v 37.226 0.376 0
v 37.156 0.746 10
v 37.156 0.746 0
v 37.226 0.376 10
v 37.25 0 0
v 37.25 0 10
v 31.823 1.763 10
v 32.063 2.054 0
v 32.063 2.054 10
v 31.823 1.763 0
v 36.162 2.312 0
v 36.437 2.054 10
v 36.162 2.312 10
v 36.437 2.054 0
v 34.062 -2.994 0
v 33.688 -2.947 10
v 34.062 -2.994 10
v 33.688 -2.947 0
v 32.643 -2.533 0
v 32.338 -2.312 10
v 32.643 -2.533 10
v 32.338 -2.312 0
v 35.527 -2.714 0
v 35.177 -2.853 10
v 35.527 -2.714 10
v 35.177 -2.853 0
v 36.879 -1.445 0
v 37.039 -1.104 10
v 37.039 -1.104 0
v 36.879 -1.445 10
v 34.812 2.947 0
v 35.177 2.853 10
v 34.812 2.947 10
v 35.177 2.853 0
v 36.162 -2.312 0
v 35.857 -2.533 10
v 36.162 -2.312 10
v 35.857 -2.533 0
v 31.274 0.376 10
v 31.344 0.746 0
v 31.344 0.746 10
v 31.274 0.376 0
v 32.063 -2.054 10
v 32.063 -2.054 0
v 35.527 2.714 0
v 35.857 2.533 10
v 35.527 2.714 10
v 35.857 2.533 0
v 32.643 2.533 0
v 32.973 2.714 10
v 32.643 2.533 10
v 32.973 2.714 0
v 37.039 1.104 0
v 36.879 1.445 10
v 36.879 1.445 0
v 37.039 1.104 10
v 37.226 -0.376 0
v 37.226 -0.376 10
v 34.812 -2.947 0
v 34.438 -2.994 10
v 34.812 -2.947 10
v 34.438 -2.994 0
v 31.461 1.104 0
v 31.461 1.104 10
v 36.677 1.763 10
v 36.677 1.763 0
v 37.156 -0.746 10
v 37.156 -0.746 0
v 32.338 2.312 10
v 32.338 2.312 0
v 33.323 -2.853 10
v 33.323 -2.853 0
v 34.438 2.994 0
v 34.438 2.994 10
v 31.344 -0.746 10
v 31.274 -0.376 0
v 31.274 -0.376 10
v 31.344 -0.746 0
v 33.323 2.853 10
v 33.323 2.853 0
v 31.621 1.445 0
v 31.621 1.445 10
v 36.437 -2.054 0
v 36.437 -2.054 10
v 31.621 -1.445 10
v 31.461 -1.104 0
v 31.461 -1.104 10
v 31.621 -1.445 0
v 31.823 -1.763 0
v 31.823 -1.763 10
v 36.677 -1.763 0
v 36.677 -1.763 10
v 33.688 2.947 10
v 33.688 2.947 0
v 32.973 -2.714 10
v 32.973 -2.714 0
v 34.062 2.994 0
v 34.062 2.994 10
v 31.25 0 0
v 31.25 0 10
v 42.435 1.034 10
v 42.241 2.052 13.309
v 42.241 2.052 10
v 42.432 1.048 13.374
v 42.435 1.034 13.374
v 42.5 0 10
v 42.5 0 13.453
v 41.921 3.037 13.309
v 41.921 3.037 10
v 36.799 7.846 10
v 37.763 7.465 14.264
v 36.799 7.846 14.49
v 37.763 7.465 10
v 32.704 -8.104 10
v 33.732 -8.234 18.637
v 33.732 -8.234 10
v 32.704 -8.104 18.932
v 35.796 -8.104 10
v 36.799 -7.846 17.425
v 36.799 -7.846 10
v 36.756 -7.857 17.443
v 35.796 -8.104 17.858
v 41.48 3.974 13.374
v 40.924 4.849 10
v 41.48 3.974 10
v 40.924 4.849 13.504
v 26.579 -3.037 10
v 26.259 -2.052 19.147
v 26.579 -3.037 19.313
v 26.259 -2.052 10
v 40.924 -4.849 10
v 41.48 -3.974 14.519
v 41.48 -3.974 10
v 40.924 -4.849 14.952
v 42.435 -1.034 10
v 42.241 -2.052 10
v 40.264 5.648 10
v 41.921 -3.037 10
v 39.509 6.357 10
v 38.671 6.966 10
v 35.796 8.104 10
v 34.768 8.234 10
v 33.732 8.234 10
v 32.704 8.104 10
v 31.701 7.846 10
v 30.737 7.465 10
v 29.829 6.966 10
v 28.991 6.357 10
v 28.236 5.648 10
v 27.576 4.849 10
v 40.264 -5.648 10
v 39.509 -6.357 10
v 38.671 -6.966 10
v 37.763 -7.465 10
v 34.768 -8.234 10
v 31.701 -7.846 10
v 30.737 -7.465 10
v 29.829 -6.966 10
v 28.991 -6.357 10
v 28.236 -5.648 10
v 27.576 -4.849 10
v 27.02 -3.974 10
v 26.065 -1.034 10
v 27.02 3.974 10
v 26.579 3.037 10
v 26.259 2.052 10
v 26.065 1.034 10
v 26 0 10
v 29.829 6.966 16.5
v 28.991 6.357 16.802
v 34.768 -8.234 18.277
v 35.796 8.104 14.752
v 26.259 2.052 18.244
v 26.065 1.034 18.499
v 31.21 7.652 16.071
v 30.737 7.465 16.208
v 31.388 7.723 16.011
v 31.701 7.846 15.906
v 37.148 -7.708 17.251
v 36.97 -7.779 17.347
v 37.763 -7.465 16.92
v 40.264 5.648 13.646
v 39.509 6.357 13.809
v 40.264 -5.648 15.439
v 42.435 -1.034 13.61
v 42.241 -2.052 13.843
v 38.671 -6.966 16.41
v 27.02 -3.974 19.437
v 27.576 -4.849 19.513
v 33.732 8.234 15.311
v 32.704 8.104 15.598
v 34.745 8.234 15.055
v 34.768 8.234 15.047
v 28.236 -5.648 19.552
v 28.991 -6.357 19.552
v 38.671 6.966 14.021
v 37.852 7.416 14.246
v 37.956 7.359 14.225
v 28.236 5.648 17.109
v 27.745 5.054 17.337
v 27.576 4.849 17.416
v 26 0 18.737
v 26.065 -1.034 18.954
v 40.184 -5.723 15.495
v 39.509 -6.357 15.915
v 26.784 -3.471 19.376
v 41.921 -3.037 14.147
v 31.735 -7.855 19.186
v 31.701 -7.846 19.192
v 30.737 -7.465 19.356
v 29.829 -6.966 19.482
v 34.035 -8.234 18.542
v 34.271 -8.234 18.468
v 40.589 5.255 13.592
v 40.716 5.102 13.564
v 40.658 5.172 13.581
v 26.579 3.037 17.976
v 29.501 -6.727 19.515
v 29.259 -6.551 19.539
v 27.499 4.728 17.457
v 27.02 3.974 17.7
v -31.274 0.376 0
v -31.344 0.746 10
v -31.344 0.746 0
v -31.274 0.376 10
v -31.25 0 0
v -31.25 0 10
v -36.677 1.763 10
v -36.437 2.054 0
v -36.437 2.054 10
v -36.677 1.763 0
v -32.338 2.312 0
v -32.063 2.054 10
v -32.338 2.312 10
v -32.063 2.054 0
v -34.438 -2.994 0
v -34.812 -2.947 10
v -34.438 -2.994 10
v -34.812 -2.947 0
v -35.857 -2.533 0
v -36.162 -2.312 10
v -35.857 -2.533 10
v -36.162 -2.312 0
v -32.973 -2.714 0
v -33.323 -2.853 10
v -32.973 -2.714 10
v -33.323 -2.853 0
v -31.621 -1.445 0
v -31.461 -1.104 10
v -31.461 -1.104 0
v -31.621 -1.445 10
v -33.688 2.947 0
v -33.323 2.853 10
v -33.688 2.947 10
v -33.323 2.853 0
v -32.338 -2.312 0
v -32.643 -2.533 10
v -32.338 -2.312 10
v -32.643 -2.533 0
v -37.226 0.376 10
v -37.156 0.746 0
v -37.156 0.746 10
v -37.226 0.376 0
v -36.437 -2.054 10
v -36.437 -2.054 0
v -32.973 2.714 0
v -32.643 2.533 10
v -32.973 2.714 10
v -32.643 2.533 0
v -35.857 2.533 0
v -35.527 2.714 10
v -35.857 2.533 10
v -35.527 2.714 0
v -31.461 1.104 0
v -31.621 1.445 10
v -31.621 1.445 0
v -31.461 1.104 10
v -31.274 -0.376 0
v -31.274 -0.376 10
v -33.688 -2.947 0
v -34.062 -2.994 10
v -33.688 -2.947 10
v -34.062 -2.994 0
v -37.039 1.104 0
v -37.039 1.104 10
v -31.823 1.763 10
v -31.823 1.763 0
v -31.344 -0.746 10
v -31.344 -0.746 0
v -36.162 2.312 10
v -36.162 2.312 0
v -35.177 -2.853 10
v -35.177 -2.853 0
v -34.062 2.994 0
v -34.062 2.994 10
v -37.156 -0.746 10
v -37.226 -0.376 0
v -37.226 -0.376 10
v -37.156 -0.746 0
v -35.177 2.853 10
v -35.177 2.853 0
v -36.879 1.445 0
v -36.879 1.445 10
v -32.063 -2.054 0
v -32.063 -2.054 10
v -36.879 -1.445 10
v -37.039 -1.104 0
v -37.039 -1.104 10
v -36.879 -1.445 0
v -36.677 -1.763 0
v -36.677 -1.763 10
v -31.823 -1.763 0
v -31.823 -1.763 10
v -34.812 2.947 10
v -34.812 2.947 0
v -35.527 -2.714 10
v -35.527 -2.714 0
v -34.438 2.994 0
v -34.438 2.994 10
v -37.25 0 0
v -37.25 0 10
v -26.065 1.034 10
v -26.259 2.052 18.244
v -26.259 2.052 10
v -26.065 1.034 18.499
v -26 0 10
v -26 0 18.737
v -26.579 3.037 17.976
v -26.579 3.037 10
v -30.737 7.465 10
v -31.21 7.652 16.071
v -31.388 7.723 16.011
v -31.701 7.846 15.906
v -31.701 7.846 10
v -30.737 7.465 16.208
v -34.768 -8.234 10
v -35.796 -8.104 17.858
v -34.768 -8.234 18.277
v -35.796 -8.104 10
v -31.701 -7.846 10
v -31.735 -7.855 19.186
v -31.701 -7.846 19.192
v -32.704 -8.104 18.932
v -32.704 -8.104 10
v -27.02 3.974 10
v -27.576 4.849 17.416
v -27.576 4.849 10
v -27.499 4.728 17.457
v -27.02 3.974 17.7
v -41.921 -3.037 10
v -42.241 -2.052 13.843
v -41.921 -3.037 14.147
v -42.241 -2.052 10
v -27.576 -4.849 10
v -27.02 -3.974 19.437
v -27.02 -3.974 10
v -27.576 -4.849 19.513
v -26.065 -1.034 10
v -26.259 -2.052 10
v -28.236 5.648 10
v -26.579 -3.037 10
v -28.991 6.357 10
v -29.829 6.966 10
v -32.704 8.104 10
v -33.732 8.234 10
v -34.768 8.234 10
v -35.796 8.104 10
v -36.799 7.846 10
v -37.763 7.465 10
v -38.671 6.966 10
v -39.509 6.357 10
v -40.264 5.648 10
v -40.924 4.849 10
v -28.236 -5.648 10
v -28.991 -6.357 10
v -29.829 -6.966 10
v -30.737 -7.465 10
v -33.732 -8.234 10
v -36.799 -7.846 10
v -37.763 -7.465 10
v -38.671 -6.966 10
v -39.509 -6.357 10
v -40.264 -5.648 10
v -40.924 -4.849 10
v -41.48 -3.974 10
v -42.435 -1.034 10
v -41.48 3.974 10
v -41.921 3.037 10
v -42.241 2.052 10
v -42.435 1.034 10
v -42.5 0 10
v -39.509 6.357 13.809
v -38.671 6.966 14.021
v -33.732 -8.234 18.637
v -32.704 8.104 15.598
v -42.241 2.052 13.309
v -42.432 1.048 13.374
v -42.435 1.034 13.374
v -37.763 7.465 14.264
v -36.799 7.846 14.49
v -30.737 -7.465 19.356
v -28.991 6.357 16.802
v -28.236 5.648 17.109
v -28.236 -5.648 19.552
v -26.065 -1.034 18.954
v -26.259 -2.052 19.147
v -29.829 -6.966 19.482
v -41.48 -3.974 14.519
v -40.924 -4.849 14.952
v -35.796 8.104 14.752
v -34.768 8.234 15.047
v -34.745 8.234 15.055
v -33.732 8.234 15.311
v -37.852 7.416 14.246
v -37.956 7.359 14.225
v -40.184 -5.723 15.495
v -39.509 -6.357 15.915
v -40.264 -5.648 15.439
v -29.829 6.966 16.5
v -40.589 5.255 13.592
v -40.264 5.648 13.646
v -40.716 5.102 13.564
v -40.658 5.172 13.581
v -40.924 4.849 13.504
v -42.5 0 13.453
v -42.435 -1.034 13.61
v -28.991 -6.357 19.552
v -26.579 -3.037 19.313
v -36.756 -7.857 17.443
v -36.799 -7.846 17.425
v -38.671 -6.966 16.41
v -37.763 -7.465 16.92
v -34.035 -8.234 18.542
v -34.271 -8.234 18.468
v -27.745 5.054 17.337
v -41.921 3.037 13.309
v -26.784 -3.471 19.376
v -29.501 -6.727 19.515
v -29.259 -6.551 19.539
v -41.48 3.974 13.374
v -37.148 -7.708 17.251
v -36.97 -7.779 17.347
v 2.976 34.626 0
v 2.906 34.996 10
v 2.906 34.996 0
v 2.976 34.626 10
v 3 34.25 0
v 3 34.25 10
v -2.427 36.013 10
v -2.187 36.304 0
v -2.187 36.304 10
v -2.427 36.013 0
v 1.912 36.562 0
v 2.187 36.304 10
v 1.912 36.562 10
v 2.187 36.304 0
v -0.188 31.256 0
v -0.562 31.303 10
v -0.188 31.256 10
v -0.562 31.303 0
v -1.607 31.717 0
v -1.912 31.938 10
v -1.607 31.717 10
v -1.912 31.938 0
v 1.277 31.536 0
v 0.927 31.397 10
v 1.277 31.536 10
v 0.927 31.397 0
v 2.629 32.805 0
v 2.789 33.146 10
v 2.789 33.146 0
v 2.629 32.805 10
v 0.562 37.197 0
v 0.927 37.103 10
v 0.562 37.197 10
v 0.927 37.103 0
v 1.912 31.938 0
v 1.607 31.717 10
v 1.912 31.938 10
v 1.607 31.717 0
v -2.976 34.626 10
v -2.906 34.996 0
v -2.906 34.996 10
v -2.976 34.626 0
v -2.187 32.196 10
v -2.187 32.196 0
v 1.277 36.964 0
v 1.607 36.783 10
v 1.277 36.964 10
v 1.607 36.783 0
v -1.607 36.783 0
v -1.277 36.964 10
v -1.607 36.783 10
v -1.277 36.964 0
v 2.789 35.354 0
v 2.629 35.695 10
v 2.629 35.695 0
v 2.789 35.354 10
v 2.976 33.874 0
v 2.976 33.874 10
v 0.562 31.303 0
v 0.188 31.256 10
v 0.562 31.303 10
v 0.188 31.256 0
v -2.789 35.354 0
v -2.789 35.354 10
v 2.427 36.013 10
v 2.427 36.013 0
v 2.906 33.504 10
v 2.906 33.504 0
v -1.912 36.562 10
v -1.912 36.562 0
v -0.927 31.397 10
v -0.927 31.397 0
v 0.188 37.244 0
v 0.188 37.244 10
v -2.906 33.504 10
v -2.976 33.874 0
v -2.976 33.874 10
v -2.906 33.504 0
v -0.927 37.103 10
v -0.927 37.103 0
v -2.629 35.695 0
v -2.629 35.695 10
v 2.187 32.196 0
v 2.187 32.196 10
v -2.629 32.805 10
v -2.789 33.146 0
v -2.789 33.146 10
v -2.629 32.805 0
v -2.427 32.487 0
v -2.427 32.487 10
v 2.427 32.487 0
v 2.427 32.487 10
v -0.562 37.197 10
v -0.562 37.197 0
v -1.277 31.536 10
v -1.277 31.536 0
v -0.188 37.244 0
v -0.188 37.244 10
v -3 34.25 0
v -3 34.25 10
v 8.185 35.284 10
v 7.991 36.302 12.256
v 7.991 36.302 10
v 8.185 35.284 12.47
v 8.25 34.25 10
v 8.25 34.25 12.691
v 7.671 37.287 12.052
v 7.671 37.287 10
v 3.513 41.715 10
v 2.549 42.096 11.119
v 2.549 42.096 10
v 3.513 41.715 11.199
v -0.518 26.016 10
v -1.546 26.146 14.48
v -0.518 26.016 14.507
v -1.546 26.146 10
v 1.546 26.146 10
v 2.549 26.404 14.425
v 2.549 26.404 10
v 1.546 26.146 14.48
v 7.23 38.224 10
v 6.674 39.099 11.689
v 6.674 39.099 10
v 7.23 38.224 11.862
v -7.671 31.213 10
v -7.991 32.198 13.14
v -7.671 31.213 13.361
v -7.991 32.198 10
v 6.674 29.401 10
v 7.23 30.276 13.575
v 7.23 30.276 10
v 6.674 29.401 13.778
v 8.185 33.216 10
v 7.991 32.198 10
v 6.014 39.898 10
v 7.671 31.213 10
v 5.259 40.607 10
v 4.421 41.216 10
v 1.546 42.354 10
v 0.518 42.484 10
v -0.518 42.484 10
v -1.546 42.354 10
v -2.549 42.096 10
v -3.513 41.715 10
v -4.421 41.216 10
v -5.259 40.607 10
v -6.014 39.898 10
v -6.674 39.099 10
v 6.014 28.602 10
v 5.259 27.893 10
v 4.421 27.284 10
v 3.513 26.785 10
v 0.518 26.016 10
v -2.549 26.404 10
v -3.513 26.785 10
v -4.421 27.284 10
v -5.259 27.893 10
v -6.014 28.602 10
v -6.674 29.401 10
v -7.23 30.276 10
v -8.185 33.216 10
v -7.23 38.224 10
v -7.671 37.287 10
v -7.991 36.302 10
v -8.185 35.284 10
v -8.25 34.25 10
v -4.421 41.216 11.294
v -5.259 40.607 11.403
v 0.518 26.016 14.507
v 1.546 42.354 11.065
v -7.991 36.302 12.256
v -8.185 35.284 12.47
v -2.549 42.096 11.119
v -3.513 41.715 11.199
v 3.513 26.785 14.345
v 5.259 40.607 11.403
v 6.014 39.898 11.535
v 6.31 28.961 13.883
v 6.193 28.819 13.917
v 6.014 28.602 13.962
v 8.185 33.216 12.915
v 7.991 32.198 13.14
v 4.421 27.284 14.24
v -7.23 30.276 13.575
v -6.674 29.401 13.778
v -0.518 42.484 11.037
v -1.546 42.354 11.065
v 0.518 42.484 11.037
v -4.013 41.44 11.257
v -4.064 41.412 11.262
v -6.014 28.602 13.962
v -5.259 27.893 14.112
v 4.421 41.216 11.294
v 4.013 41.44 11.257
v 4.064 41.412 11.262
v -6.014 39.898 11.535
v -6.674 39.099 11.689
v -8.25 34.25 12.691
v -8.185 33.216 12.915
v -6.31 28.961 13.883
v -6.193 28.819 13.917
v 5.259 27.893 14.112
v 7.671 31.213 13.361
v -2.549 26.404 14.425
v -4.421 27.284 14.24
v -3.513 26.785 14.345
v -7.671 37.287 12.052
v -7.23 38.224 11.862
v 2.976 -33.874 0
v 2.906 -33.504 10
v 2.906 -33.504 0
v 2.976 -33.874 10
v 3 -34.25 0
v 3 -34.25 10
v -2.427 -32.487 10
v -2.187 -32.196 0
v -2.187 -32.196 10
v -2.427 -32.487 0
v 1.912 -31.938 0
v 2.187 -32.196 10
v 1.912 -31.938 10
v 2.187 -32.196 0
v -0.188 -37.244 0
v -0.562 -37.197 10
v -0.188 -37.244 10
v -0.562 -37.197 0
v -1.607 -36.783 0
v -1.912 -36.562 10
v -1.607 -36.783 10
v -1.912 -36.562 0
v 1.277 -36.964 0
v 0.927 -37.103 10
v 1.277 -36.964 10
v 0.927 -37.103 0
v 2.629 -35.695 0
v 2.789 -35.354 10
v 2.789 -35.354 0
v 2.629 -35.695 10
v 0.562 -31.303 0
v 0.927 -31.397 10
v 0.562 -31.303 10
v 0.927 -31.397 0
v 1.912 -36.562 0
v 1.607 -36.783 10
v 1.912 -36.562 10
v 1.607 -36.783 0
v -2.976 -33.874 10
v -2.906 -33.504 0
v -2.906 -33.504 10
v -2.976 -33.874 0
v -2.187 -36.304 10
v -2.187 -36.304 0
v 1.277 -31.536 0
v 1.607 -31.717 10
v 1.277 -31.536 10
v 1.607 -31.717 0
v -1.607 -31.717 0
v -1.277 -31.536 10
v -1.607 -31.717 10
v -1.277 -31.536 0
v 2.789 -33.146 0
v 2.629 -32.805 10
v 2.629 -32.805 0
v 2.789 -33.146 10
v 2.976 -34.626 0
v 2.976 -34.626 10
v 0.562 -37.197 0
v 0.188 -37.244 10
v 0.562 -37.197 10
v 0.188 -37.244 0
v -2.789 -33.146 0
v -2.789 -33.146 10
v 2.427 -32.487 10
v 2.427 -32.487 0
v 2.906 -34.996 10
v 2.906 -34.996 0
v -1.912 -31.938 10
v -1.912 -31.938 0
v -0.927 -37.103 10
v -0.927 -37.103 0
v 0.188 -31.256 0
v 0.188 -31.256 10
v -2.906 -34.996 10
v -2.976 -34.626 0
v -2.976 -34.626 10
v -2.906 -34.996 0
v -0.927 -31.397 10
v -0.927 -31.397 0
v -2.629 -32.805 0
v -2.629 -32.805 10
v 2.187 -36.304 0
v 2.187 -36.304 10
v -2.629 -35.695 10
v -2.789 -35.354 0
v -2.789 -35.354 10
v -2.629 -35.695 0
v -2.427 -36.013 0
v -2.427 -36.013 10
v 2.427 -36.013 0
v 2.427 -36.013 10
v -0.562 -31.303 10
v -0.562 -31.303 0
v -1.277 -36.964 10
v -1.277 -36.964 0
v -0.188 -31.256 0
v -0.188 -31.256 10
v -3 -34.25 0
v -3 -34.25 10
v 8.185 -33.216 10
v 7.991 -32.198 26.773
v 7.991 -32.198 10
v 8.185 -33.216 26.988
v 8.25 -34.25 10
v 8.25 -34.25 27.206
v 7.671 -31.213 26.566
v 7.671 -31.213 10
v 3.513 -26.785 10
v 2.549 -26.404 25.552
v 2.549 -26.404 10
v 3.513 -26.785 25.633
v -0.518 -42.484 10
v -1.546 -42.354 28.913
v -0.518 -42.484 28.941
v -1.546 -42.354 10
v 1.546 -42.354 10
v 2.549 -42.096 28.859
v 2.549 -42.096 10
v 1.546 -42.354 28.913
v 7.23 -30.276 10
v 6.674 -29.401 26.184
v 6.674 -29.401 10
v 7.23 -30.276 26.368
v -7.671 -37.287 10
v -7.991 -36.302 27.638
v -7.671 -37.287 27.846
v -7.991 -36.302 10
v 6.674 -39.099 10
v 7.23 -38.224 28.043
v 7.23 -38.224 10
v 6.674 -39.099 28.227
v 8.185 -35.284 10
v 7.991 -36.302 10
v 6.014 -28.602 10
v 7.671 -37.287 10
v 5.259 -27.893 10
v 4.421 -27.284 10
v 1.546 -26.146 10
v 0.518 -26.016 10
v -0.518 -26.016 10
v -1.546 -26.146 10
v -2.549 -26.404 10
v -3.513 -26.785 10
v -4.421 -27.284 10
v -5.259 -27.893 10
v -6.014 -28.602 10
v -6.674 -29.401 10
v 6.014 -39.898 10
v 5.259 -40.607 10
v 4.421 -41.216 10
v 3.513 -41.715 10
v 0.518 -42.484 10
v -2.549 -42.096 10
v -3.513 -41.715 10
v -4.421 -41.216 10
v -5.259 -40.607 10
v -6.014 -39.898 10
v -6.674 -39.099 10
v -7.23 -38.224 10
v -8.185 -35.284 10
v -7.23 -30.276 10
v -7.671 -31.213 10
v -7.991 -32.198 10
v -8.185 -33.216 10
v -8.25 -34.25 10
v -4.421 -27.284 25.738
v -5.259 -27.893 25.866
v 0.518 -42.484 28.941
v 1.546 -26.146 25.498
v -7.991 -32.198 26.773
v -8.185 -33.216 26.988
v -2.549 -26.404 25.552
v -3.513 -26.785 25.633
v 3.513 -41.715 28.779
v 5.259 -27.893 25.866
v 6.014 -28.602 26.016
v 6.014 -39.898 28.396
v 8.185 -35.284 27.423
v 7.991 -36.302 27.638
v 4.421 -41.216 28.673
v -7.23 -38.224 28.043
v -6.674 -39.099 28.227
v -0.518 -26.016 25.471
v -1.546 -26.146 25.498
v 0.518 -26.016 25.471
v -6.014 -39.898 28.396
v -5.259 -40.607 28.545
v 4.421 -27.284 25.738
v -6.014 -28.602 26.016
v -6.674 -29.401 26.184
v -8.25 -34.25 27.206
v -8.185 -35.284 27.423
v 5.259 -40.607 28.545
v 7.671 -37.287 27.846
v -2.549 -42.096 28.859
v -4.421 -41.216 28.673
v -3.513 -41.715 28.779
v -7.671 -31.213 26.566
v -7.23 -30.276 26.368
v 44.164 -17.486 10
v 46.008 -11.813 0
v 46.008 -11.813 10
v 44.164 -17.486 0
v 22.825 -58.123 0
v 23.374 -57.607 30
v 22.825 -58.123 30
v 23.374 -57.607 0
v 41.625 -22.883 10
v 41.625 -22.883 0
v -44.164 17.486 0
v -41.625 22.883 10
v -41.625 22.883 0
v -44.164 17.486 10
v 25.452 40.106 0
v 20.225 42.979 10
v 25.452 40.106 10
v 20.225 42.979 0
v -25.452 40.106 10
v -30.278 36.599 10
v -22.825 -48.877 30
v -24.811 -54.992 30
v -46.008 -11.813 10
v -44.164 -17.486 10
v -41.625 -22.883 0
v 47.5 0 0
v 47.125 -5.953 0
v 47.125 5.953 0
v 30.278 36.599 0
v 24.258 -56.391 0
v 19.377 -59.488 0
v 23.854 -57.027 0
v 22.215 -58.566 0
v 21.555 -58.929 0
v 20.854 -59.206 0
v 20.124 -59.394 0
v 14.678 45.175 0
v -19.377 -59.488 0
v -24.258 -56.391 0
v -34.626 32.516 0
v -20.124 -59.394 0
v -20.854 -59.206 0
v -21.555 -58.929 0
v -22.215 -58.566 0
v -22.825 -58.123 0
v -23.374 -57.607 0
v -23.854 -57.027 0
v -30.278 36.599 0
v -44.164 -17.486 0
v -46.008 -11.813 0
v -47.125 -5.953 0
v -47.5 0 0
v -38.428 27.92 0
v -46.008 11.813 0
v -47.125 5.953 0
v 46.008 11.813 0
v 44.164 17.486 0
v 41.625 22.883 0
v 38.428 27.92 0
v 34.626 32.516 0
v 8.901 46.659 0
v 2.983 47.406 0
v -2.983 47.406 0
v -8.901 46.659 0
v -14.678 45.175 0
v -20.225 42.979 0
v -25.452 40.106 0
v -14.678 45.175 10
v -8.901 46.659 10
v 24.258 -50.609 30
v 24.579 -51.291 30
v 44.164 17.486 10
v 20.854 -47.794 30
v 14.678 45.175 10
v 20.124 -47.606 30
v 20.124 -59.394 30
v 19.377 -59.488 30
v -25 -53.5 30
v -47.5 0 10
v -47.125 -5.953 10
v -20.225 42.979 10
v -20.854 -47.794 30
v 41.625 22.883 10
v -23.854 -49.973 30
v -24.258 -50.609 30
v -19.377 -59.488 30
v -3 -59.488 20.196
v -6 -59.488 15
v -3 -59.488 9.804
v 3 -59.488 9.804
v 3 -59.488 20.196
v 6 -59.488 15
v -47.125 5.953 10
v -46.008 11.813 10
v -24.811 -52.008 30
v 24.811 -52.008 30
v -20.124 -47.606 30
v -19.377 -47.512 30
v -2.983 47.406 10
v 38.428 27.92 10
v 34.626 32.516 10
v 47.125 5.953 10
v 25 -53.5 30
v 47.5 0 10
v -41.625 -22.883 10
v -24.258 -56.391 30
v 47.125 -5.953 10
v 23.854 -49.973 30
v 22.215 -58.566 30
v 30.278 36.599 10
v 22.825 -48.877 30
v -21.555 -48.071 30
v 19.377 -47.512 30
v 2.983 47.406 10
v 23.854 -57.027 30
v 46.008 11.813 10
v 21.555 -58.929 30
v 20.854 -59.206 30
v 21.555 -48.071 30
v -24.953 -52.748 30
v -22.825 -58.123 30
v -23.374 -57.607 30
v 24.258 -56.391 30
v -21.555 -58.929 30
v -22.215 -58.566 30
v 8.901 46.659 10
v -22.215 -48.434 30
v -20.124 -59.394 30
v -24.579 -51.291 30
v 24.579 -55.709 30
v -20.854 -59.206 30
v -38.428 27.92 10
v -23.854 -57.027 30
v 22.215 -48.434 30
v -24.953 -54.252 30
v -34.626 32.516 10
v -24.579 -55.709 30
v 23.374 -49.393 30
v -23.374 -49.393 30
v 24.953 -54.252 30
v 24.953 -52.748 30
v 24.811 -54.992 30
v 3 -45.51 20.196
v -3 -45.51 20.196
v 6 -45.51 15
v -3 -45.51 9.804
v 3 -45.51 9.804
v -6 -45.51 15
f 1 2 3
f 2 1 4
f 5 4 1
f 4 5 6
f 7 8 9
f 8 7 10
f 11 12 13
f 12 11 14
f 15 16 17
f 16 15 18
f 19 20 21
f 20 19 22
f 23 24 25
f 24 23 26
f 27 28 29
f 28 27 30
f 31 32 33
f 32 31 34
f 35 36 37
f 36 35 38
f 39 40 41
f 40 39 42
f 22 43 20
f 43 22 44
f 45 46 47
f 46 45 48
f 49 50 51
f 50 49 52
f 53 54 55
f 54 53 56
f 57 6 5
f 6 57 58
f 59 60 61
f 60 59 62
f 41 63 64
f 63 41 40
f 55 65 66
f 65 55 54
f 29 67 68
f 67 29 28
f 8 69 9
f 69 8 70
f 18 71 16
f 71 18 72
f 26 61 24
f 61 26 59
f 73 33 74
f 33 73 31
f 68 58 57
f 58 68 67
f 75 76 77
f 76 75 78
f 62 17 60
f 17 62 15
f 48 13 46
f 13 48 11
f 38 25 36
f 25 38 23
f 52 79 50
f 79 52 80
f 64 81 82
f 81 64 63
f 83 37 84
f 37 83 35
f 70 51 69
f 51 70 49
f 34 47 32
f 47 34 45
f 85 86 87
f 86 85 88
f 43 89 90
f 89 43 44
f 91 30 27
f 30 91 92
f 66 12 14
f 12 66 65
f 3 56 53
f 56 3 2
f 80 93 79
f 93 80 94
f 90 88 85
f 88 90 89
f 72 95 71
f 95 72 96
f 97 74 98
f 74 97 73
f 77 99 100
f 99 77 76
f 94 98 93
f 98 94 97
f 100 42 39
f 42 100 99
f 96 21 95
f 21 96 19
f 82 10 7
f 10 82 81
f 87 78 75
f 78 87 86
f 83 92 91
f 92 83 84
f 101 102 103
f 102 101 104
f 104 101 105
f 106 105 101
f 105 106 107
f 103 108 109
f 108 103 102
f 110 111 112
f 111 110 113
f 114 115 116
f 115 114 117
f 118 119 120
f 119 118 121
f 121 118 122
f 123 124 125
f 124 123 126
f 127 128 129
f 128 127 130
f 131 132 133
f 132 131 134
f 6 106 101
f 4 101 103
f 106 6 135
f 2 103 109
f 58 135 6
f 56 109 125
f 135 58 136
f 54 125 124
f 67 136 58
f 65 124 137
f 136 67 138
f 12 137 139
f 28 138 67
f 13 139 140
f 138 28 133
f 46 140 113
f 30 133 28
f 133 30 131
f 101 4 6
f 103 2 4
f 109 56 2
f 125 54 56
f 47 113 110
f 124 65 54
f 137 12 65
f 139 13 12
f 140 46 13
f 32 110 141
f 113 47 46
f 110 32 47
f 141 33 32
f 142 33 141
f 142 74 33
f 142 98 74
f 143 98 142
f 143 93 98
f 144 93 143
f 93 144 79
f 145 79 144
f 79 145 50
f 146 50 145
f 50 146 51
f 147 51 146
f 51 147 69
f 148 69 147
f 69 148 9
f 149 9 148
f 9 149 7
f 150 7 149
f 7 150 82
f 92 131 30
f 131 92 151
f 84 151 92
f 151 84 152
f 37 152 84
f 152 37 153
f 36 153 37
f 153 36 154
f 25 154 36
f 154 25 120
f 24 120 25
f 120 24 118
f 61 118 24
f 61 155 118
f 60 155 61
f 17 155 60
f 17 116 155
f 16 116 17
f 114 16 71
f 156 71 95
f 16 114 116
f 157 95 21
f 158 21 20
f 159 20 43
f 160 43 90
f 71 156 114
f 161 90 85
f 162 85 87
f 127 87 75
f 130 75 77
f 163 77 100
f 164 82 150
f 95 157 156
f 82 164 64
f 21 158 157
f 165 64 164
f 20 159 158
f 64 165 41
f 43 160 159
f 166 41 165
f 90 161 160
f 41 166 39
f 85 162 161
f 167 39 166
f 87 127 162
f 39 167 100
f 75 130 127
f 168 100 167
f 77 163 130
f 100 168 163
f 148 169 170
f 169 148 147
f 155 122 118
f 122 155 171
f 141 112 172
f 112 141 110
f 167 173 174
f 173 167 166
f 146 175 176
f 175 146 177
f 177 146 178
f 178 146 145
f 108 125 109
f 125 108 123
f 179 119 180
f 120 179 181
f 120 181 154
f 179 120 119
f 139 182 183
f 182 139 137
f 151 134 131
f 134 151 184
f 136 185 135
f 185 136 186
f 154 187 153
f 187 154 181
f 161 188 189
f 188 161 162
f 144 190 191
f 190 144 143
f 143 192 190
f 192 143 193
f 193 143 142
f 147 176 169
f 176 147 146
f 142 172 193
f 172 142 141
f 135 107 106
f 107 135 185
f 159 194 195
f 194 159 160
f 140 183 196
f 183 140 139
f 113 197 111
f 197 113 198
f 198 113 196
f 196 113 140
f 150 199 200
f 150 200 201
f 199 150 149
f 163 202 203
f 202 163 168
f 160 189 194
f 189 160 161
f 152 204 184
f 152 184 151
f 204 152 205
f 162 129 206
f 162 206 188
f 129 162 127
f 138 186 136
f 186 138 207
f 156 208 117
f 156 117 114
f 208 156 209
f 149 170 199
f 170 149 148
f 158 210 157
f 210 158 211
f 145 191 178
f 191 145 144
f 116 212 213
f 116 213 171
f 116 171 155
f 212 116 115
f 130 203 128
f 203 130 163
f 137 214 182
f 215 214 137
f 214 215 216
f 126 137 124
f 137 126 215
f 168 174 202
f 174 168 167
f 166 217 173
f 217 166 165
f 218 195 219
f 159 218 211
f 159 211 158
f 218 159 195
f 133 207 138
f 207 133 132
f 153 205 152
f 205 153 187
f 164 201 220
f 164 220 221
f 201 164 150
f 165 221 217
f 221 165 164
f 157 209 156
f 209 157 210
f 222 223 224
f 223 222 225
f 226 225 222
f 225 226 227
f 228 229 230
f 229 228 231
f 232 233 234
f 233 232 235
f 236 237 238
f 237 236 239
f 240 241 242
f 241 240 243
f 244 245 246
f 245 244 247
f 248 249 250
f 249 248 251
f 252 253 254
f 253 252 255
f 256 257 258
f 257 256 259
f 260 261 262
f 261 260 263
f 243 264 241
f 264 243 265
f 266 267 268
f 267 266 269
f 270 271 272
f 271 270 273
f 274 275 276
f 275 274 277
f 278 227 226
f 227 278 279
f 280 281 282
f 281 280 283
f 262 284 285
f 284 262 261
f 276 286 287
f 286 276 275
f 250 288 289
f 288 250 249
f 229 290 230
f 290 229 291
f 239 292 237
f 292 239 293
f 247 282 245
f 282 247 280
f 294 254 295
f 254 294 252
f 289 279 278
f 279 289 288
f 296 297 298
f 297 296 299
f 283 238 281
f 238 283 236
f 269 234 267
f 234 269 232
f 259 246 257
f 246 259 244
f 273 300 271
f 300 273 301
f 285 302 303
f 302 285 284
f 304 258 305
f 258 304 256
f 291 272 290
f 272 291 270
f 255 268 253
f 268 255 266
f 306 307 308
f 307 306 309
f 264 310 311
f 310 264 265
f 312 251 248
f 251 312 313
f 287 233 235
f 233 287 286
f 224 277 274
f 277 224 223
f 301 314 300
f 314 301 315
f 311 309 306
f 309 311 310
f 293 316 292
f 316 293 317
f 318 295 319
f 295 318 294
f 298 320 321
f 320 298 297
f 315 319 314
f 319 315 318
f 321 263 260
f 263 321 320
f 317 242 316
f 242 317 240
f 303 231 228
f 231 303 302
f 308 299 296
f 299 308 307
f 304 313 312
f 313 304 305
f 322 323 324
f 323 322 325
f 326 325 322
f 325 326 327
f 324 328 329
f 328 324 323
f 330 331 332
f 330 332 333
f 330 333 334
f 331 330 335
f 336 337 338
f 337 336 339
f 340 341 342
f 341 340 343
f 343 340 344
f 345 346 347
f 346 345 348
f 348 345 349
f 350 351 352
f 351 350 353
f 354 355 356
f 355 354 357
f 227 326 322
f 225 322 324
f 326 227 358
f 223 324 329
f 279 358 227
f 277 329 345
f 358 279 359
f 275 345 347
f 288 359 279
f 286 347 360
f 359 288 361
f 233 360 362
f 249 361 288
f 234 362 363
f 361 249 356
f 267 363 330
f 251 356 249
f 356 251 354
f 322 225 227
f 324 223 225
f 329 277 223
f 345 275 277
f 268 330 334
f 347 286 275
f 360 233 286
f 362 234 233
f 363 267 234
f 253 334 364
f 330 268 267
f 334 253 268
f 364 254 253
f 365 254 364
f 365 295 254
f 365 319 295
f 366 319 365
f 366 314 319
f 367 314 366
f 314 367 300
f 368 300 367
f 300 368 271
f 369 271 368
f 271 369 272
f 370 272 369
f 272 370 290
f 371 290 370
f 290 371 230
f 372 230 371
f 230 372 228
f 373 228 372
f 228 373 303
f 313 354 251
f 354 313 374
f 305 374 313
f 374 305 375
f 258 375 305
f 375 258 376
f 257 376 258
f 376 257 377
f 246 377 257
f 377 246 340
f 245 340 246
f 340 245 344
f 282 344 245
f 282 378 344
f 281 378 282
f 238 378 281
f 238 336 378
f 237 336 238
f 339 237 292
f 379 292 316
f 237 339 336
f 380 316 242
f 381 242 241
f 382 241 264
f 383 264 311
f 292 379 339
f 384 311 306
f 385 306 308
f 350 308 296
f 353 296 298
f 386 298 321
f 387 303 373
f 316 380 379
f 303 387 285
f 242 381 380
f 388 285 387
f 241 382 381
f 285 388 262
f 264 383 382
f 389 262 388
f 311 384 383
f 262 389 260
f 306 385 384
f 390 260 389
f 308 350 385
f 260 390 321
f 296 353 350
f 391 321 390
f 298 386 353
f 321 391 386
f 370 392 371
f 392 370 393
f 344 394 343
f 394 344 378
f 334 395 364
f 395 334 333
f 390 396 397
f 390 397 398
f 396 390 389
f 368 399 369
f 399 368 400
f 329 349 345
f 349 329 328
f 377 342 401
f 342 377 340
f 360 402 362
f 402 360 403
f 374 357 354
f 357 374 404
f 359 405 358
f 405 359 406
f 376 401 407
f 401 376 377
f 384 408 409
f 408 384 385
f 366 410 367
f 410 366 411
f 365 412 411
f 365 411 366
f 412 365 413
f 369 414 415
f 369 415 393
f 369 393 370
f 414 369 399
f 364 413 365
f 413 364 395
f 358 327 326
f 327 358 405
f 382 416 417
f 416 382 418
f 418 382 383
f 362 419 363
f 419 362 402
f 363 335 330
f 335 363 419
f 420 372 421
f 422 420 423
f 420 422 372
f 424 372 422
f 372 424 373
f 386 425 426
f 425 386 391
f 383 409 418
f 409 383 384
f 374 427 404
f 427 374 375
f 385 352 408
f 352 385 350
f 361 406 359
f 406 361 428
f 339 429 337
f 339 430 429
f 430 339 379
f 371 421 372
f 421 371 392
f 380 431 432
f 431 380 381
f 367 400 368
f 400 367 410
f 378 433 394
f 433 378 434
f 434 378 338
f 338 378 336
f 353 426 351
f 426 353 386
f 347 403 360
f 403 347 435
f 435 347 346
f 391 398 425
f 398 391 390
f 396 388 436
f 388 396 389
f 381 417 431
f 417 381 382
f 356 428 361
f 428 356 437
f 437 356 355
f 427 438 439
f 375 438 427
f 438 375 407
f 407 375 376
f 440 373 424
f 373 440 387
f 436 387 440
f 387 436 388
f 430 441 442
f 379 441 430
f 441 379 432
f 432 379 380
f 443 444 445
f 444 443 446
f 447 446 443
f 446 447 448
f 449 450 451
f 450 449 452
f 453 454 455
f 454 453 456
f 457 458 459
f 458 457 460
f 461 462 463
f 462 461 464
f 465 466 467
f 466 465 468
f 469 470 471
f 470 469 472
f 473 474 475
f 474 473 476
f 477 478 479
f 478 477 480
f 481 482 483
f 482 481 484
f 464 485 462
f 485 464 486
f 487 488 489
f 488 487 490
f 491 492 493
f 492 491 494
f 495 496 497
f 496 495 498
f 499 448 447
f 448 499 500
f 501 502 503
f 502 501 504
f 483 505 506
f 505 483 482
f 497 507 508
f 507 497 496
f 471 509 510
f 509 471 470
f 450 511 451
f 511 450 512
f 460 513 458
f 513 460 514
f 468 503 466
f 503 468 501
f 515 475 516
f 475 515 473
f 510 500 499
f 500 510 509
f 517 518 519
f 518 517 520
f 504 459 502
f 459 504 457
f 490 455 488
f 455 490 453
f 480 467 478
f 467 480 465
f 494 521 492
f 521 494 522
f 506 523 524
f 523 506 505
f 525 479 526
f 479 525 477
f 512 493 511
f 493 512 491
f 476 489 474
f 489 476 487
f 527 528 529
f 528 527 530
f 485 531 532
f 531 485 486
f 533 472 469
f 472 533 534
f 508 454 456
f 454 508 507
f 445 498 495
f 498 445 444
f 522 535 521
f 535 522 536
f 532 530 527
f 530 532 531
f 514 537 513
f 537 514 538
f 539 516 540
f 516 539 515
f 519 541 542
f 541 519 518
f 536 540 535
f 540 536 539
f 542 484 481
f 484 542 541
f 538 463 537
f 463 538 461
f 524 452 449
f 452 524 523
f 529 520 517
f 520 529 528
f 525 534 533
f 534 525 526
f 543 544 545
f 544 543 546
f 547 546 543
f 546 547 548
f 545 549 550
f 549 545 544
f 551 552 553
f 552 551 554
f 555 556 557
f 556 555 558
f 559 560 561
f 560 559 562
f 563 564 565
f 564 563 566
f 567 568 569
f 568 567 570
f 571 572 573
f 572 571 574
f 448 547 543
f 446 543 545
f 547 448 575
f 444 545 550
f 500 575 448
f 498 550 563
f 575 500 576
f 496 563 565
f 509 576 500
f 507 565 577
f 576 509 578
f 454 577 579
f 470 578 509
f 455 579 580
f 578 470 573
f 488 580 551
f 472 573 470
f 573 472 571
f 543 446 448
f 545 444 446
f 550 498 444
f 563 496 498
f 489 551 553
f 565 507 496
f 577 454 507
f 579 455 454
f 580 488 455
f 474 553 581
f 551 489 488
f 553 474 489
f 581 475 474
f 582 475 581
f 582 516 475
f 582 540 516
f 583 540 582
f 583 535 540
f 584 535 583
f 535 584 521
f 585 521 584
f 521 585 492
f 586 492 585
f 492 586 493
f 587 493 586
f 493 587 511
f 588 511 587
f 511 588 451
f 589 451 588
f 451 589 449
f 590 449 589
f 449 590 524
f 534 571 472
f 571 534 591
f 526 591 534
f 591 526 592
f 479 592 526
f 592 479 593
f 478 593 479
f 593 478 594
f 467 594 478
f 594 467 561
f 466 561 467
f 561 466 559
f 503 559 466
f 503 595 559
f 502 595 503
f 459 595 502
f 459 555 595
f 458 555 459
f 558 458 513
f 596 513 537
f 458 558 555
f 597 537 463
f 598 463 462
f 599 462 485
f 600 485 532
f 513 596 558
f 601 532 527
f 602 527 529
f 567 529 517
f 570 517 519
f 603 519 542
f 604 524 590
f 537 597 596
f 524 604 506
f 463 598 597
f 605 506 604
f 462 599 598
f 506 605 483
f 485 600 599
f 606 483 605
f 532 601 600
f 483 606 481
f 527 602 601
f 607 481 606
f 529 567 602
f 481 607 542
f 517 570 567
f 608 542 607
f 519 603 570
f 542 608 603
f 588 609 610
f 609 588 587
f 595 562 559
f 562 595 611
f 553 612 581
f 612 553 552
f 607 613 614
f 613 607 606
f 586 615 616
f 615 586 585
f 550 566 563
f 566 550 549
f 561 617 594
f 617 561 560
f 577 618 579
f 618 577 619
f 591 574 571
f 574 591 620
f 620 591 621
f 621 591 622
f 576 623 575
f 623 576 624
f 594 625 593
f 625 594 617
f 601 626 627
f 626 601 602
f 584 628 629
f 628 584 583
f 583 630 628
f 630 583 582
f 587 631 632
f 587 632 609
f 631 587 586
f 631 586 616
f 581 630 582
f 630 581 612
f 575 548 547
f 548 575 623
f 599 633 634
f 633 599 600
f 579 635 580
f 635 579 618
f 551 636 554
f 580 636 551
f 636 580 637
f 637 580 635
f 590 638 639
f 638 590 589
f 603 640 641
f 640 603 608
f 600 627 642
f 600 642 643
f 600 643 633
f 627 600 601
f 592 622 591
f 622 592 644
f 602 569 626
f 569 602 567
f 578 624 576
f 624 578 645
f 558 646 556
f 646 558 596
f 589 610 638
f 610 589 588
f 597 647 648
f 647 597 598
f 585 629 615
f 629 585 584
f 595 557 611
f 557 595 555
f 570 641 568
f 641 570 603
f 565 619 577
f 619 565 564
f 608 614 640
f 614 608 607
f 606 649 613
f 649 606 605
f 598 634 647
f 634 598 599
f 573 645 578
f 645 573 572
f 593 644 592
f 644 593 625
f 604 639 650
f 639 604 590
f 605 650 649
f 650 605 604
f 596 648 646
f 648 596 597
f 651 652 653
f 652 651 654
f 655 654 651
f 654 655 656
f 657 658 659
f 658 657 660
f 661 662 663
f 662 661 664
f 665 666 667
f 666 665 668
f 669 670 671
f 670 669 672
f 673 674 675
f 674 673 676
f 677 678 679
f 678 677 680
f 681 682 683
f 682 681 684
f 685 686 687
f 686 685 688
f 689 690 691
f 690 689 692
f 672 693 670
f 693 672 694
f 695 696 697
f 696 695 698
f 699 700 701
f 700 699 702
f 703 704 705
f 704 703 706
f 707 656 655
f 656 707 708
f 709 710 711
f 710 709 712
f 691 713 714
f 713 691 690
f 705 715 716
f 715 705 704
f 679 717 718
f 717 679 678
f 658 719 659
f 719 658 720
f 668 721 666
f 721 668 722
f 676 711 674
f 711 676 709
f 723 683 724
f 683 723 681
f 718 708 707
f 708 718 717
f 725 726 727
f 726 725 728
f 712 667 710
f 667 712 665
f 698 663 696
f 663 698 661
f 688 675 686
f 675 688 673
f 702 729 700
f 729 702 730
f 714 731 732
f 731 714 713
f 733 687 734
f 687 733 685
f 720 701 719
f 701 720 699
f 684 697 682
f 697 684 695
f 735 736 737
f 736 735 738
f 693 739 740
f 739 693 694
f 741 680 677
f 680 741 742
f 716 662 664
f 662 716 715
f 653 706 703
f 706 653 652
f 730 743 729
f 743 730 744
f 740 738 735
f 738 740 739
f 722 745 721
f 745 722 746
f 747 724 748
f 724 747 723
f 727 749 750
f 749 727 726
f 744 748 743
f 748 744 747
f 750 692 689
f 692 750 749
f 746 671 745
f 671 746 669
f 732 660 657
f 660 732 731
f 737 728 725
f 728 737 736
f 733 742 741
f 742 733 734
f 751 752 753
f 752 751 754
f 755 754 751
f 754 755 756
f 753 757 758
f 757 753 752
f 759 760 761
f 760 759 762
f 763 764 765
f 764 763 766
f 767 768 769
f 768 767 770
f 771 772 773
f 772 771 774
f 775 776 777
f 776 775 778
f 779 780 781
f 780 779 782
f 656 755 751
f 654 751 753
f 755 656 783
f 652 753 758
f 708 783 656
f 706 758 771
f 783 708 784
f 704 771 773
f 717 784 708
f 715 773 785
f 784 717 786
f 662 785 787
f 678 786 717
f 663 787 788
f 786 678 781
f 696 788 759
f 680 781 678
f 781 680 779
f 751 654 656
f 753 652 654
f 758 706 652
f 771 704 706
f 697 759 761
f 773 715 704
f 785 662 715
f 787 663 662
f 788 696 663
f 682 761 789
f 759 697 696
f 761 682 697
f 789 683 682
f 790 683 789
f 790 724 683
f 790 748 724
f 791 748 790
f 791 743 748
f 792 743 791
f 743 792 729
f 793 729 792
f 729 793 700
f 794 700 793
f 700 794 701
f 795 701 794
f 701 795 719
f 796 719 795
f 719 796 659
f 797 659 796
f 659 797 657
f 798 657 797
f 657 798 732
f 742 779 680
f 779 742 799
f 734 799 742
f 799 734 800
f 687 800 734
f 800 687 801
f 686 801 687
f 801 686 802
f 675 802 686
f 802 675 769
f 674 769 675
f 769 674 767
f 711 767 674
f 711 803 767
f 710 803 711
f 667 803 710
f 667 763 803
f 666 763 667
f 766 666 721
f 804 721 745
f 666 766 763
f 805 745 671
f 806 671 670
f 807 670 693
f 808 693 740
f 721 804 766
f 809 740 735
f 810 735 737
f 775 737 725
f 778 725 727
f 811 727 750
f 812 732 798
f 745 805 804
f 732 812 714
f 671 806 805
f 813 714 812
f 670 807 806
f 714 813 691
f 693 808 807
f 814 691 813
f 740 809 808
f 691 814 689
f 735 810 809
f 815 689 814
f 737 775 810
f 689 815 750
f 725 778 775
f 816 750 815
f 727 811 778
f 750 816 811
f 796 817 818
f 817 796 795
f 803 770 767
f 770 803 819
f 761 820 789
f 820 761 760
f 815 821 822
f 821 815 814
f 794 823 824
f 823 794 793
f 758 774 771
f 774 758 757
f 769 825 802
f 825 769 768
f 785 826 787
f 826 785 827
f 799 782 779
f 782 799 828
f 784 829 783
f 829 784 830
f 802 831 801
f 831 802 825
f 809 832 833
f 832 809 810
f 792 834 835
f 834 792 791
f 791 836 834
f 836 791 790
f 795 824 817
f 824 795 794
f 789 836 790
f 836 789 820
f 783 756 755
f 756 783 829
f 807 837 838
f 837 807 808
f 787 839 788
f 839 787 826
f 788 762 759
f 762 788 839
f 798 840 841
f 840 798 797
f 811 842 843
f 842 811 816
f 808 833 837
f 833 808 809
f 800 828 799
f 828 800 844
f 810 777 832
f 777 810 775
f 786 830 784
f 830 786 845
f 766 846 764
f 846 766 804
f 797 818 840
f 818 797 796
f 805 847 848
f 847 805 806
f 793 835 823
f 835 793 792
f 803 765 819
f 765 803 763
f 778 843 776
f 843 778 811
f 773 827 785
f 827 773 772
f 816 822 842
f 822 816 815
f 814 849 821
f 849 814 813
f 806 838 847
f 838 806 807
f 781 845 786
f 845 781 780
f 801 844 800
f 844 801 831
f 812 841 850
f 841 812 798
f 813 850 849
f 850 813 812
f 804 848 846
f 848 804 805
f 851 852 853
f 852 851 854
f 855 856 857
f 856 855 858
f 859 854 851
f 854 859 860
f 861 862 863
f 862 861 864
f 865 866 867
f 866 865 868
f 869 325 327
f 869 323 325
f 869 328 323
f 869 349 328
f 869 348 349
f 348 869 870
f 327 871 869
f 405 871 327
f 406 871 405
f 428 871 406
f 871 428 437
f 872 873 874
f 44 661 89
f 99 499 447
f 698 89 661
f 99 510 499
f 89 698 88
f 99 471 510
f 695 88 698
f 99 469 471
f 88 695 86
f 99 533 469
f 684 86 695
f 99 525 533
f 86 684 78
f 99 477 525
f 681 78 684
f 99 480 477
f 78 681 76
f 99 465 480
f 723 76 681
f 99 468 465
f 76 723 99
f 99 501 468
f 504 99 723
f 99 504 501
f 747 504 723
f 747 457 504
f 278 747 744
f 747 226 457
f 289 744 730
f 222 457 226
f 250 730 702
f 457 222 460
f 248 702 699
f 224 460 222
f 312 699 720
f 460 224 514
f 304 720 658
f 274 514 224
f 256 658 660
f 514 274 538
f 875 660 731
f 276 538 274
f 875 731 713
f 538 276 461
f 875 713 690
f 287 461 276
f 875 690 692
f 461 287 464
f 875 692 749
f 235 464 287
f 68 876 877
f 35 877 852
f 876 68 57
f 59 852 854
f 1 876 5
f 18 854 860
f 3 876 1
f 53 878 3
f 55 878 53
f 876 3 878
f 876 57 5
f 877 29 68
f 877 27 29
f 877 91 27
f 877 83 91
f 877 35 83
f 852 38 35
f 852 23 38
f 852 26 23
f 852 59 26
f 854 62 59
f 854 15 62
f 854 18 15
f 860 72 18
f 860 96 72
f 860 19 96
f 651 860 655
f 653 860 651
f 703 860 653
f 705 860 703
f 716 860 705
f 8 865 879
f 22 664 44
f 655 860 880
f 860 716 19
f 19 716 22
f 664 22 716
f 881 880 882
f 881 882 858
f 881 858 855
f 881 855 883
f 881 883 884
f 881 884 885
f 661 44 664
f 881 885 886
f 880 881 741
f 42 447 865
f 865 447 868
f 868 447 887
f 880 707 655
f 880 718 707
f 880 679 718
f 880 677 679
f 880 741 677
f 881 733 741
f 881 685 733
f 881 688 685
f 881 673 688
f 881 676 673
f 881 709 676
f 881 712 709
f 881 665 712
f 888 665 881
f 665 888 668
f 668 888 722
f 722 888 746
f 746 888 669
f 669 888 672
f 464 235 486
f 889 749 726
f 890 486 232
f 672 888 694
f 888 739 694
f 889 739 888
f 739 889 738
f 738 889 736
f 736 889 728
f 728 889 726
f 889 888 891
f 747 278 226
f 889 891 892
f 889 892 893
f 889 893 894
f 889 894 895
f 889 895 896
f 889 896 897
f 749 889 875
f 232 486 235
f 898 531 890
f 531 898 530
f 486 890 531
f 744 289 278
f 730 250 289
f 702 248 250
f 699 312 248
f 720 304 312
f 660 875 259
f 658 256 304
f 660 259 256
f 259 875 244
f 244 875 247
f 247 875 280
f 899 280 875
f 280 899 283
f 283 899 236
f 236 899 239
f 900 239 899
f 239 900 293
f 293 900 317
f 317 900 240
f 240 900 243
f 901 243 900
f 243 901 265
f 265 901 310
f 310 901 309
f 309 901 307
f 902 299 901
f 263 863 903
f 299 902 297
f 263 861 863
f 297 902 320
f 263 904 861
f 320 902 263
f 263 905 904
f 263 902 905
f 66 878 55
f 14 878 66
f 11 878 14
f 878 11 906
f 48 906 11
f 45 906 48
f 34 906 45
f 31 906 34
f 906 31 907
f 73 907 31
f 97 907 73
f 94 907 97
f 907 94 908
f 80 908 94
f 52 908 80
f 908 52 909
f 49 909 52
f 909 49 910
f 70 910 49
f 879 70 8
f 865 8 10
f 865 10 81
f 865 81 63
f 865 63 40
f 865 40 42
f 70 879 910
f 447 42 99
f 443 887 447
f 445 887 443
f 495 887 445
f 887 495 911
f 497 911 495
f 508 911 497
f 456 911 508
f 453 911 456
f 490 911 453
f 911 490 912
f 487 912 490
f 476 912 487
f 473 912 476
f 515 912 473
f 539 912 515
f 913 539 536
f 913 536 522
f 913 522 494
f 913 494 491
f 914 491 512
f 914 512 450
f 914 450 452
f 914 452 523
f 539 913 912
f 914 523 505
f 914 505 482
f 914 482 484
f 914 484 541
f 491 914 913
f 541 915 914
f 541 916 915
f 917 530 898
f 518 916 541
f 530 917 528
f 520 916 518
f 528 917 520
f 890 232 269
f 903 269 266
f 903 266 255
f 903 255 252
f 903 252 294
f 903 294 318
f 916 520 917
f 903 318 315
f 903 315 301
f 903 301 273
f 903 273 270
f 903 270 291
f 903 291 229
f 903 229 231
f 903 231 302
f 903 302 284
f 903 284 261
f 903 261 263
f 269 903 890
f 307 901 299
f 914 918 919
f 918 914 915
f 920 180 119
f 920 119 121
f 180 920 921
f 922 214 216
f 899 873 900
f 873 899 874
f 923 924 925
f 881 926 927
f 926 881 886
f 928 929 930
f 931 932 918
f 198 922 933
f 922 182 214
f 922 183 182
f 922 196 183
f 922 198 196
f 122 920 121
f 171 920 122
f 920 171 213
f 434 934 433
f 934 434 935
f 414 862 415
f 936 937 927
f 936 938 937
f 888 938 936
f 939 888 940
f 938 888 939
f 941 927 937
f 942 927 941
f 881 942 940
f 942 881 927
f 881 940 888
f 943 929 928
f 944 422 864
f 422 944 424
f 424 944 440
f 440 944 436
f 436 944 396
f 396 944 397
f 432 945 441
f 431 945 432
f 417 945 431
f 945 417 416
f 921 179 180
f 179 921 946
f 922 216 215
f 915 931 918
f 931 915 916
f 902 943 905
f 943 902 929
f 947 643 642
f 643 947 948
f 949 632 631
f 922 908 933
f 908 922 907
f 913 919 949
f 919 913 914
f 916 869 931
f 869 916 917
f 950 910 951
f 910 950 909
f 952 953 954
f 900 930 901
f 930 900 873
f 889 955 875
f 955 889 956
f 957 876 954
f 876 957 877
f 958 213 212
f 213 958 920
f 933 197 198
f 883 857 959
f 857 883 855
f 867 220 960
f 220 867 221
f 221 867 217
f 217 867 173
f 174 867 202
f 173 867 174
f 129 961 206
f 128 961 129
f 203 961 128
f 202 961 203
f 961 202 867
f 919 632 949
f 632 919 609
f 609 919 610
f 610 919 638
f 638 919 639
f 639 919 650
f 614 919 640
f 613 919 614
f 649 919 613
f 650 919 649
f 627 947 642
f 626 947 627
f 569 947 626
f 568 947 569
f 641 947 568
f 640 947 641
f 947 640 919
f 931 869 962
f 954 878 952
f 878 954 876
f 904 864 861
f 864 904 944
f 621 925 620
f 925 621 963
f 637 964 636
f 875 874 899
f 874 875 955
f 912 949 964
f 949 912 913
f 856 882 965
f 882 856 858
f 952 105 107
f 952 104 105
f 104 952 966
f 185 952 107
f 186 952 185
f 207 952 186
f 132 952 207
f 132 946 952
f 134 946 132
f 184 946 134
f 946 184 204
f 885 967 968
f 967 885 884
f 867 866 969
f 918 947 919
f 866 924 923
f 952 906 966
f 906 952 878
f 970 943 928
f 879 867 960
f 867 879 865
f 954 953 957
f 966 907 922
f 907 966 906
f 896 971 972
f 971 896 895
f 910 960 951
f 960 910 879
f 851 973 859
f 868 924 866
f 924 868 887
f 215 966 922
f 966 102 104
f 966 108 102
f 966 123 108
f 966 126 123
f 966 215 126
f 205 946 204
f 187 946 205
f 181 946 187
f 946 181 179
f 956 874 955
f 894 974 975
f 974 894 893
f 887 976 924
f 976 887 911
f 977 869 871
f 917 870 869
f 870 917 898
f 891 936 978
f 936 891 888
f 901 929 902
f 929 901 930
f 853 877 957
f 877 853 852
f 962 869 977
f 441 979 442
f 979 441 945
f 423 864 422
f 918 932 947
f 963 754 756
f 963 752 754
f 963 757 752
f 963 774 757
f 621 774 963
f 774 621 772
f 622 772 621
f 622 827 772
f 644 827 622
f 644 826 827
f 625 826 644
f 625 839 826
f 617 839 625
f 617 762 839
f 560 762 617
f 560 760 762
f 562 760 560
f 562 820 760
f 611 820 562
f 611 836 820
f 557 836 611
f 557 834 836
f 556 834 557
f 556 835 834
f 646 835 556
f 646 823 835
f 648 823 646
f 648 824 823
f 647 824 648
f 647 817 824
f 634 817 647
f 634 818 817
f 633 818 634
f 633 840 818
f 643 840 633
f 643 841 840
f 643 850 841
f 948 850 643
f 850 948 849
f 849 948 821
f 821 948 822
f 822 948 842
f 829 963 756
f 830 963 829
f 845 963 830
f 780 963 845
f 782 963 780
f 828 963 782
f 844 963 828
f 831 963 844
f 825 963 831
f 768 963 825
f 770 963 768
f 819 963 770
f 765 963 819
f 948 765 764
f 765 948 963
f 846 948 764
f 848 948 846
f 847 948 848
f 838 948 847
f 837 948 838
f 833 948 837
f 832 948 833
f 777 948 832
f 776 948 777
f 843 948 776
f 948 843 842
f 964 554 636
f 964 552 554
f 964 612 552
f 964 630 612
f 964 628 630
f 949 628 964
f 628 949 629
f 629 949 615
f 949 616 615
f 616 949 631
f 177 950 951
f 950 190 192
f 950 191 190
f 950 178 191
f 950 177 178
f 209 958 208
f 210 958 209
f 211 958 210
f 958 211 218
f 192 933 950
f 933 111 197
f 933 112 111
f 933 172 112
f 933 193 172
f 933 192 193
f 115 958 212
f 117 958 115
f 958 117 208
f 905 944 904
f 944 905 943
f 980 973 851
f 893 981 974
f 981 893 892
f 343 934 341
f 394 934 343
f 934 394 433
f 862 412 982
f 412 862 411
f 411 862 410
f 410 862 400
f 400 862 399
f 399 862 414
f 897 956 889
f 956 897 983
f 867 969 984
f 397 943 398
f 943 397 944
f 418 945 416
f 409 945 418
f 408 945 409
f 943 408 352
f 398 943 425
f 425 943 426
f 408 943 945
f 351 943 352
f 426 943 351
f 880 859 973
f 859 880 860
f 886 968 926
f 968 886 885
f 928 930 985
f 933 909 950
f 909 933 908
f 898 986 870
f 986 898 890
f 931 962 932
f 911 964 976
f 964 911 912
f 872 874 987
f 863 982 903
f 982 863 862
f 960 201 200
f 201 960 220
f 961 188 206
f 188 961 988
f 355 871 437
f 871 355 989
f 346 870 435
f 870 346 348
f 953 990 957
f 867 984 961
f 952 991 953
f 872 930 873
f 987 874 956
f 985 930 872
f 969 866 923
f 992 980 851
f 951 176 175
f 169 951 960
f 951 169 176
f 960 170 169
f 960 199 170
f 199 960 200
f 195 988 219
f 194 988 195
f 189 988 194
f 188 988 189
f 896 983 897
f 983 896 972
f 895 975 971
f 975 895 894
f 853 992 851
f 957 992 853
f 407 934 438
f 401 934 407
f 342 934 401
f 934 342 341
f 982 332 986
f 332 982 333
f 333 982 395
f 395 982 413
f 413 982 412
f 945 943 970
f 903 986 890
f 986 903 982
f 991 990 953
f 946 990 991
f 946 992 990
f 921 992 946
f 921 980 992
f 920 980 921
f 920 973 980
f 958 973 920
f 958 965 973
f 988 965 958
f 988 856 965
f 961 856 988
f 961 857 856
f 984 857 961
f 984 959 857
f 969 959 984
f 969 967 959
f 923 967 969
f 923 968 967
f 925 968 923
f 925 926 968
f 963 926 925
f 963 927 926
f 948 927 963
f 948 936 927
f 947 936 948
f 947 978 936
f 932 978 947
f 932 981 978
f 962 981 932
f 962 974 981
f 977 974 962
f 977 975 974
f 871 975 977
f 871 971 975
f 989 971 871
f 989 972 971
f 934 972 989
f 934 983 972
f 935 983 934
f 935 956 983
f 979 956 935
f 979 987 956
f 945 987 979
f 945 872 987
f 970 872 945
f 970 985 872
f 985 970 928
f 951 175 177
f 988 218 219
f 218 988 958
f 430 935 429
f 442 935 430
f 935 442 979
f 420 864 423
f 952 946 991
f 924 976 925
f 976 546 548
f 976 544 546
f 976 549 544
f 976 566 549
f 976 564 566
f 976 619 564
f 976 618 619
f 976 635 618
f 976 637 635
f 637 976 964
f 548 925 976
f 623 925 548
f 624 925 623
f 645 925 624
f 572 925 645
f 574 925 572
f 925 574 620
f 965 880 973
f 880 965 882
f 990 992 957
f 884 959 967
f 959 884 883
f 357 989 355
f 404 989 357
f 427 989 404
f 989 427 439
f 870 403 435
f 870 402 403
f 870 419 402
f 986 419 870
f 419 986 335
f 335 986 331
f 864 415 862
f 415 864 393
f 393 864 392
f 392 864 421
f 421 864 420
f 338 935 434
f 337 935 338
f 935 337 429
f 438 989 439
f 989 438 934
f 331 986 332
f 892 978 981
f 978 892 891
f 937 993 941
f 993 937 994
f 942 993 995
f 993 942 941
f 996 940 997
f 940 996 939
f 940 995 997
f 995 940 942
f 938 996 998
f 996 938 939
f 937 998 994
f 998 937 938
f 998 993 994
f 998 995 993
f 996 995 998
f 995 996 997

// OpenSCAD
baseDia=95;
baseThickness=10;
mountHolePositionRadius=68.5/2;
mountHoleDia=6;
mountHoleInsetDia=mountHoleDia*2.75;
tripodSurfaceWidth=25;
tripodSurfaceDepth=30;
tripodSurfaceThickness=12;

tripodNutInsetDia=12;
tripodNutInsetDepth=14;

textEnabled=false;
textDepth=0.5;
fontHeight=4;
textBottomInset=tripodSurfaceThickness/2-fontHeight/2;

logoEnabled=true;
logoScaleFactor=0.15;
logoXAdjust=-8.5;
logoYAdjust=-1.5;

overlap=0.01;
$fn=50;

difference() {
    hull() {
        cylinder(d=baseDia, h=baseThickness);
        translate([0,-baseDia/2-tripodSurfaceThickness/2,0])
            tripodAttachment();
    }
    rotate([0,0,0]) {
        translate([mountHolePositionRadius,0,0]) mountHole();
        translate([-mountHolePositionRadius,0,0]) mountHole();
        translate([0,mountHolePositionRadius,0]) mountHole();
        translate([0,-mountHolePositionRadius,0]) mountHole();
    }
    // tripod 1/4-20 nut inset
    translate([0,-baseDia/2-tripodSurfaceThickness-overlap,tripodSurfaceDepth/2])
            rotate([-90,0,0]) {
                cylinder(d=tripodNutInsetDia, h=tripodNutInsetDepth, $fn=6);
            }
    if (textEnabled) {
        translate([0,-baseDia/2-tripodSurfaceThickness+textBottomInset,tripodSurfaceDepth-textDepth]) {
            scale([1.4,1,1])
                linear_extrude(height = 2)
                    text("AMCREST",font="Arial:style=Black",size=fontHeight,halign="center");
        }
    }
    if (logoEnabled) {
        translate([-tripodSurfaceWidth/2+logoXAdjust,
                -baseDia/2-tripodSurfaceThickness+textBottomInset+logoYAdjust,
                tripodSurfaceDepth-textDepth]) {
            scale([logoScaleFactor,logoScaleFactor,1])
            linear_extrude(height = 2)
                import("amcrest_logo.dxf");
        }
    }
}


module mountHole() {
    union() {
        translate([0,0,-overlap]) cylinder(d=mountHoleDia, h=baseThickness+overlap*2);
        // inset hole
        translate([0,0,baseThickness]) cylinder(d=mountHoleInsetDia, h=tripodSurfaceDepth+overlap);
    }
}

module tripodAttachment() {
    hull() {
        translate([tripodSurfaceWidth-tripodSurfaceThickness/2,0,0])
            cylinder(d=tripodSurfaceThickness, h=tripodSurfaceDepth);
        translate([-tripodSurfaceWidth+tripodSurfaceThickness/2,0,0])
            cylinder(d=tripodSurfaceThickness, h=tripodSurfaceDepth);
    }
}
